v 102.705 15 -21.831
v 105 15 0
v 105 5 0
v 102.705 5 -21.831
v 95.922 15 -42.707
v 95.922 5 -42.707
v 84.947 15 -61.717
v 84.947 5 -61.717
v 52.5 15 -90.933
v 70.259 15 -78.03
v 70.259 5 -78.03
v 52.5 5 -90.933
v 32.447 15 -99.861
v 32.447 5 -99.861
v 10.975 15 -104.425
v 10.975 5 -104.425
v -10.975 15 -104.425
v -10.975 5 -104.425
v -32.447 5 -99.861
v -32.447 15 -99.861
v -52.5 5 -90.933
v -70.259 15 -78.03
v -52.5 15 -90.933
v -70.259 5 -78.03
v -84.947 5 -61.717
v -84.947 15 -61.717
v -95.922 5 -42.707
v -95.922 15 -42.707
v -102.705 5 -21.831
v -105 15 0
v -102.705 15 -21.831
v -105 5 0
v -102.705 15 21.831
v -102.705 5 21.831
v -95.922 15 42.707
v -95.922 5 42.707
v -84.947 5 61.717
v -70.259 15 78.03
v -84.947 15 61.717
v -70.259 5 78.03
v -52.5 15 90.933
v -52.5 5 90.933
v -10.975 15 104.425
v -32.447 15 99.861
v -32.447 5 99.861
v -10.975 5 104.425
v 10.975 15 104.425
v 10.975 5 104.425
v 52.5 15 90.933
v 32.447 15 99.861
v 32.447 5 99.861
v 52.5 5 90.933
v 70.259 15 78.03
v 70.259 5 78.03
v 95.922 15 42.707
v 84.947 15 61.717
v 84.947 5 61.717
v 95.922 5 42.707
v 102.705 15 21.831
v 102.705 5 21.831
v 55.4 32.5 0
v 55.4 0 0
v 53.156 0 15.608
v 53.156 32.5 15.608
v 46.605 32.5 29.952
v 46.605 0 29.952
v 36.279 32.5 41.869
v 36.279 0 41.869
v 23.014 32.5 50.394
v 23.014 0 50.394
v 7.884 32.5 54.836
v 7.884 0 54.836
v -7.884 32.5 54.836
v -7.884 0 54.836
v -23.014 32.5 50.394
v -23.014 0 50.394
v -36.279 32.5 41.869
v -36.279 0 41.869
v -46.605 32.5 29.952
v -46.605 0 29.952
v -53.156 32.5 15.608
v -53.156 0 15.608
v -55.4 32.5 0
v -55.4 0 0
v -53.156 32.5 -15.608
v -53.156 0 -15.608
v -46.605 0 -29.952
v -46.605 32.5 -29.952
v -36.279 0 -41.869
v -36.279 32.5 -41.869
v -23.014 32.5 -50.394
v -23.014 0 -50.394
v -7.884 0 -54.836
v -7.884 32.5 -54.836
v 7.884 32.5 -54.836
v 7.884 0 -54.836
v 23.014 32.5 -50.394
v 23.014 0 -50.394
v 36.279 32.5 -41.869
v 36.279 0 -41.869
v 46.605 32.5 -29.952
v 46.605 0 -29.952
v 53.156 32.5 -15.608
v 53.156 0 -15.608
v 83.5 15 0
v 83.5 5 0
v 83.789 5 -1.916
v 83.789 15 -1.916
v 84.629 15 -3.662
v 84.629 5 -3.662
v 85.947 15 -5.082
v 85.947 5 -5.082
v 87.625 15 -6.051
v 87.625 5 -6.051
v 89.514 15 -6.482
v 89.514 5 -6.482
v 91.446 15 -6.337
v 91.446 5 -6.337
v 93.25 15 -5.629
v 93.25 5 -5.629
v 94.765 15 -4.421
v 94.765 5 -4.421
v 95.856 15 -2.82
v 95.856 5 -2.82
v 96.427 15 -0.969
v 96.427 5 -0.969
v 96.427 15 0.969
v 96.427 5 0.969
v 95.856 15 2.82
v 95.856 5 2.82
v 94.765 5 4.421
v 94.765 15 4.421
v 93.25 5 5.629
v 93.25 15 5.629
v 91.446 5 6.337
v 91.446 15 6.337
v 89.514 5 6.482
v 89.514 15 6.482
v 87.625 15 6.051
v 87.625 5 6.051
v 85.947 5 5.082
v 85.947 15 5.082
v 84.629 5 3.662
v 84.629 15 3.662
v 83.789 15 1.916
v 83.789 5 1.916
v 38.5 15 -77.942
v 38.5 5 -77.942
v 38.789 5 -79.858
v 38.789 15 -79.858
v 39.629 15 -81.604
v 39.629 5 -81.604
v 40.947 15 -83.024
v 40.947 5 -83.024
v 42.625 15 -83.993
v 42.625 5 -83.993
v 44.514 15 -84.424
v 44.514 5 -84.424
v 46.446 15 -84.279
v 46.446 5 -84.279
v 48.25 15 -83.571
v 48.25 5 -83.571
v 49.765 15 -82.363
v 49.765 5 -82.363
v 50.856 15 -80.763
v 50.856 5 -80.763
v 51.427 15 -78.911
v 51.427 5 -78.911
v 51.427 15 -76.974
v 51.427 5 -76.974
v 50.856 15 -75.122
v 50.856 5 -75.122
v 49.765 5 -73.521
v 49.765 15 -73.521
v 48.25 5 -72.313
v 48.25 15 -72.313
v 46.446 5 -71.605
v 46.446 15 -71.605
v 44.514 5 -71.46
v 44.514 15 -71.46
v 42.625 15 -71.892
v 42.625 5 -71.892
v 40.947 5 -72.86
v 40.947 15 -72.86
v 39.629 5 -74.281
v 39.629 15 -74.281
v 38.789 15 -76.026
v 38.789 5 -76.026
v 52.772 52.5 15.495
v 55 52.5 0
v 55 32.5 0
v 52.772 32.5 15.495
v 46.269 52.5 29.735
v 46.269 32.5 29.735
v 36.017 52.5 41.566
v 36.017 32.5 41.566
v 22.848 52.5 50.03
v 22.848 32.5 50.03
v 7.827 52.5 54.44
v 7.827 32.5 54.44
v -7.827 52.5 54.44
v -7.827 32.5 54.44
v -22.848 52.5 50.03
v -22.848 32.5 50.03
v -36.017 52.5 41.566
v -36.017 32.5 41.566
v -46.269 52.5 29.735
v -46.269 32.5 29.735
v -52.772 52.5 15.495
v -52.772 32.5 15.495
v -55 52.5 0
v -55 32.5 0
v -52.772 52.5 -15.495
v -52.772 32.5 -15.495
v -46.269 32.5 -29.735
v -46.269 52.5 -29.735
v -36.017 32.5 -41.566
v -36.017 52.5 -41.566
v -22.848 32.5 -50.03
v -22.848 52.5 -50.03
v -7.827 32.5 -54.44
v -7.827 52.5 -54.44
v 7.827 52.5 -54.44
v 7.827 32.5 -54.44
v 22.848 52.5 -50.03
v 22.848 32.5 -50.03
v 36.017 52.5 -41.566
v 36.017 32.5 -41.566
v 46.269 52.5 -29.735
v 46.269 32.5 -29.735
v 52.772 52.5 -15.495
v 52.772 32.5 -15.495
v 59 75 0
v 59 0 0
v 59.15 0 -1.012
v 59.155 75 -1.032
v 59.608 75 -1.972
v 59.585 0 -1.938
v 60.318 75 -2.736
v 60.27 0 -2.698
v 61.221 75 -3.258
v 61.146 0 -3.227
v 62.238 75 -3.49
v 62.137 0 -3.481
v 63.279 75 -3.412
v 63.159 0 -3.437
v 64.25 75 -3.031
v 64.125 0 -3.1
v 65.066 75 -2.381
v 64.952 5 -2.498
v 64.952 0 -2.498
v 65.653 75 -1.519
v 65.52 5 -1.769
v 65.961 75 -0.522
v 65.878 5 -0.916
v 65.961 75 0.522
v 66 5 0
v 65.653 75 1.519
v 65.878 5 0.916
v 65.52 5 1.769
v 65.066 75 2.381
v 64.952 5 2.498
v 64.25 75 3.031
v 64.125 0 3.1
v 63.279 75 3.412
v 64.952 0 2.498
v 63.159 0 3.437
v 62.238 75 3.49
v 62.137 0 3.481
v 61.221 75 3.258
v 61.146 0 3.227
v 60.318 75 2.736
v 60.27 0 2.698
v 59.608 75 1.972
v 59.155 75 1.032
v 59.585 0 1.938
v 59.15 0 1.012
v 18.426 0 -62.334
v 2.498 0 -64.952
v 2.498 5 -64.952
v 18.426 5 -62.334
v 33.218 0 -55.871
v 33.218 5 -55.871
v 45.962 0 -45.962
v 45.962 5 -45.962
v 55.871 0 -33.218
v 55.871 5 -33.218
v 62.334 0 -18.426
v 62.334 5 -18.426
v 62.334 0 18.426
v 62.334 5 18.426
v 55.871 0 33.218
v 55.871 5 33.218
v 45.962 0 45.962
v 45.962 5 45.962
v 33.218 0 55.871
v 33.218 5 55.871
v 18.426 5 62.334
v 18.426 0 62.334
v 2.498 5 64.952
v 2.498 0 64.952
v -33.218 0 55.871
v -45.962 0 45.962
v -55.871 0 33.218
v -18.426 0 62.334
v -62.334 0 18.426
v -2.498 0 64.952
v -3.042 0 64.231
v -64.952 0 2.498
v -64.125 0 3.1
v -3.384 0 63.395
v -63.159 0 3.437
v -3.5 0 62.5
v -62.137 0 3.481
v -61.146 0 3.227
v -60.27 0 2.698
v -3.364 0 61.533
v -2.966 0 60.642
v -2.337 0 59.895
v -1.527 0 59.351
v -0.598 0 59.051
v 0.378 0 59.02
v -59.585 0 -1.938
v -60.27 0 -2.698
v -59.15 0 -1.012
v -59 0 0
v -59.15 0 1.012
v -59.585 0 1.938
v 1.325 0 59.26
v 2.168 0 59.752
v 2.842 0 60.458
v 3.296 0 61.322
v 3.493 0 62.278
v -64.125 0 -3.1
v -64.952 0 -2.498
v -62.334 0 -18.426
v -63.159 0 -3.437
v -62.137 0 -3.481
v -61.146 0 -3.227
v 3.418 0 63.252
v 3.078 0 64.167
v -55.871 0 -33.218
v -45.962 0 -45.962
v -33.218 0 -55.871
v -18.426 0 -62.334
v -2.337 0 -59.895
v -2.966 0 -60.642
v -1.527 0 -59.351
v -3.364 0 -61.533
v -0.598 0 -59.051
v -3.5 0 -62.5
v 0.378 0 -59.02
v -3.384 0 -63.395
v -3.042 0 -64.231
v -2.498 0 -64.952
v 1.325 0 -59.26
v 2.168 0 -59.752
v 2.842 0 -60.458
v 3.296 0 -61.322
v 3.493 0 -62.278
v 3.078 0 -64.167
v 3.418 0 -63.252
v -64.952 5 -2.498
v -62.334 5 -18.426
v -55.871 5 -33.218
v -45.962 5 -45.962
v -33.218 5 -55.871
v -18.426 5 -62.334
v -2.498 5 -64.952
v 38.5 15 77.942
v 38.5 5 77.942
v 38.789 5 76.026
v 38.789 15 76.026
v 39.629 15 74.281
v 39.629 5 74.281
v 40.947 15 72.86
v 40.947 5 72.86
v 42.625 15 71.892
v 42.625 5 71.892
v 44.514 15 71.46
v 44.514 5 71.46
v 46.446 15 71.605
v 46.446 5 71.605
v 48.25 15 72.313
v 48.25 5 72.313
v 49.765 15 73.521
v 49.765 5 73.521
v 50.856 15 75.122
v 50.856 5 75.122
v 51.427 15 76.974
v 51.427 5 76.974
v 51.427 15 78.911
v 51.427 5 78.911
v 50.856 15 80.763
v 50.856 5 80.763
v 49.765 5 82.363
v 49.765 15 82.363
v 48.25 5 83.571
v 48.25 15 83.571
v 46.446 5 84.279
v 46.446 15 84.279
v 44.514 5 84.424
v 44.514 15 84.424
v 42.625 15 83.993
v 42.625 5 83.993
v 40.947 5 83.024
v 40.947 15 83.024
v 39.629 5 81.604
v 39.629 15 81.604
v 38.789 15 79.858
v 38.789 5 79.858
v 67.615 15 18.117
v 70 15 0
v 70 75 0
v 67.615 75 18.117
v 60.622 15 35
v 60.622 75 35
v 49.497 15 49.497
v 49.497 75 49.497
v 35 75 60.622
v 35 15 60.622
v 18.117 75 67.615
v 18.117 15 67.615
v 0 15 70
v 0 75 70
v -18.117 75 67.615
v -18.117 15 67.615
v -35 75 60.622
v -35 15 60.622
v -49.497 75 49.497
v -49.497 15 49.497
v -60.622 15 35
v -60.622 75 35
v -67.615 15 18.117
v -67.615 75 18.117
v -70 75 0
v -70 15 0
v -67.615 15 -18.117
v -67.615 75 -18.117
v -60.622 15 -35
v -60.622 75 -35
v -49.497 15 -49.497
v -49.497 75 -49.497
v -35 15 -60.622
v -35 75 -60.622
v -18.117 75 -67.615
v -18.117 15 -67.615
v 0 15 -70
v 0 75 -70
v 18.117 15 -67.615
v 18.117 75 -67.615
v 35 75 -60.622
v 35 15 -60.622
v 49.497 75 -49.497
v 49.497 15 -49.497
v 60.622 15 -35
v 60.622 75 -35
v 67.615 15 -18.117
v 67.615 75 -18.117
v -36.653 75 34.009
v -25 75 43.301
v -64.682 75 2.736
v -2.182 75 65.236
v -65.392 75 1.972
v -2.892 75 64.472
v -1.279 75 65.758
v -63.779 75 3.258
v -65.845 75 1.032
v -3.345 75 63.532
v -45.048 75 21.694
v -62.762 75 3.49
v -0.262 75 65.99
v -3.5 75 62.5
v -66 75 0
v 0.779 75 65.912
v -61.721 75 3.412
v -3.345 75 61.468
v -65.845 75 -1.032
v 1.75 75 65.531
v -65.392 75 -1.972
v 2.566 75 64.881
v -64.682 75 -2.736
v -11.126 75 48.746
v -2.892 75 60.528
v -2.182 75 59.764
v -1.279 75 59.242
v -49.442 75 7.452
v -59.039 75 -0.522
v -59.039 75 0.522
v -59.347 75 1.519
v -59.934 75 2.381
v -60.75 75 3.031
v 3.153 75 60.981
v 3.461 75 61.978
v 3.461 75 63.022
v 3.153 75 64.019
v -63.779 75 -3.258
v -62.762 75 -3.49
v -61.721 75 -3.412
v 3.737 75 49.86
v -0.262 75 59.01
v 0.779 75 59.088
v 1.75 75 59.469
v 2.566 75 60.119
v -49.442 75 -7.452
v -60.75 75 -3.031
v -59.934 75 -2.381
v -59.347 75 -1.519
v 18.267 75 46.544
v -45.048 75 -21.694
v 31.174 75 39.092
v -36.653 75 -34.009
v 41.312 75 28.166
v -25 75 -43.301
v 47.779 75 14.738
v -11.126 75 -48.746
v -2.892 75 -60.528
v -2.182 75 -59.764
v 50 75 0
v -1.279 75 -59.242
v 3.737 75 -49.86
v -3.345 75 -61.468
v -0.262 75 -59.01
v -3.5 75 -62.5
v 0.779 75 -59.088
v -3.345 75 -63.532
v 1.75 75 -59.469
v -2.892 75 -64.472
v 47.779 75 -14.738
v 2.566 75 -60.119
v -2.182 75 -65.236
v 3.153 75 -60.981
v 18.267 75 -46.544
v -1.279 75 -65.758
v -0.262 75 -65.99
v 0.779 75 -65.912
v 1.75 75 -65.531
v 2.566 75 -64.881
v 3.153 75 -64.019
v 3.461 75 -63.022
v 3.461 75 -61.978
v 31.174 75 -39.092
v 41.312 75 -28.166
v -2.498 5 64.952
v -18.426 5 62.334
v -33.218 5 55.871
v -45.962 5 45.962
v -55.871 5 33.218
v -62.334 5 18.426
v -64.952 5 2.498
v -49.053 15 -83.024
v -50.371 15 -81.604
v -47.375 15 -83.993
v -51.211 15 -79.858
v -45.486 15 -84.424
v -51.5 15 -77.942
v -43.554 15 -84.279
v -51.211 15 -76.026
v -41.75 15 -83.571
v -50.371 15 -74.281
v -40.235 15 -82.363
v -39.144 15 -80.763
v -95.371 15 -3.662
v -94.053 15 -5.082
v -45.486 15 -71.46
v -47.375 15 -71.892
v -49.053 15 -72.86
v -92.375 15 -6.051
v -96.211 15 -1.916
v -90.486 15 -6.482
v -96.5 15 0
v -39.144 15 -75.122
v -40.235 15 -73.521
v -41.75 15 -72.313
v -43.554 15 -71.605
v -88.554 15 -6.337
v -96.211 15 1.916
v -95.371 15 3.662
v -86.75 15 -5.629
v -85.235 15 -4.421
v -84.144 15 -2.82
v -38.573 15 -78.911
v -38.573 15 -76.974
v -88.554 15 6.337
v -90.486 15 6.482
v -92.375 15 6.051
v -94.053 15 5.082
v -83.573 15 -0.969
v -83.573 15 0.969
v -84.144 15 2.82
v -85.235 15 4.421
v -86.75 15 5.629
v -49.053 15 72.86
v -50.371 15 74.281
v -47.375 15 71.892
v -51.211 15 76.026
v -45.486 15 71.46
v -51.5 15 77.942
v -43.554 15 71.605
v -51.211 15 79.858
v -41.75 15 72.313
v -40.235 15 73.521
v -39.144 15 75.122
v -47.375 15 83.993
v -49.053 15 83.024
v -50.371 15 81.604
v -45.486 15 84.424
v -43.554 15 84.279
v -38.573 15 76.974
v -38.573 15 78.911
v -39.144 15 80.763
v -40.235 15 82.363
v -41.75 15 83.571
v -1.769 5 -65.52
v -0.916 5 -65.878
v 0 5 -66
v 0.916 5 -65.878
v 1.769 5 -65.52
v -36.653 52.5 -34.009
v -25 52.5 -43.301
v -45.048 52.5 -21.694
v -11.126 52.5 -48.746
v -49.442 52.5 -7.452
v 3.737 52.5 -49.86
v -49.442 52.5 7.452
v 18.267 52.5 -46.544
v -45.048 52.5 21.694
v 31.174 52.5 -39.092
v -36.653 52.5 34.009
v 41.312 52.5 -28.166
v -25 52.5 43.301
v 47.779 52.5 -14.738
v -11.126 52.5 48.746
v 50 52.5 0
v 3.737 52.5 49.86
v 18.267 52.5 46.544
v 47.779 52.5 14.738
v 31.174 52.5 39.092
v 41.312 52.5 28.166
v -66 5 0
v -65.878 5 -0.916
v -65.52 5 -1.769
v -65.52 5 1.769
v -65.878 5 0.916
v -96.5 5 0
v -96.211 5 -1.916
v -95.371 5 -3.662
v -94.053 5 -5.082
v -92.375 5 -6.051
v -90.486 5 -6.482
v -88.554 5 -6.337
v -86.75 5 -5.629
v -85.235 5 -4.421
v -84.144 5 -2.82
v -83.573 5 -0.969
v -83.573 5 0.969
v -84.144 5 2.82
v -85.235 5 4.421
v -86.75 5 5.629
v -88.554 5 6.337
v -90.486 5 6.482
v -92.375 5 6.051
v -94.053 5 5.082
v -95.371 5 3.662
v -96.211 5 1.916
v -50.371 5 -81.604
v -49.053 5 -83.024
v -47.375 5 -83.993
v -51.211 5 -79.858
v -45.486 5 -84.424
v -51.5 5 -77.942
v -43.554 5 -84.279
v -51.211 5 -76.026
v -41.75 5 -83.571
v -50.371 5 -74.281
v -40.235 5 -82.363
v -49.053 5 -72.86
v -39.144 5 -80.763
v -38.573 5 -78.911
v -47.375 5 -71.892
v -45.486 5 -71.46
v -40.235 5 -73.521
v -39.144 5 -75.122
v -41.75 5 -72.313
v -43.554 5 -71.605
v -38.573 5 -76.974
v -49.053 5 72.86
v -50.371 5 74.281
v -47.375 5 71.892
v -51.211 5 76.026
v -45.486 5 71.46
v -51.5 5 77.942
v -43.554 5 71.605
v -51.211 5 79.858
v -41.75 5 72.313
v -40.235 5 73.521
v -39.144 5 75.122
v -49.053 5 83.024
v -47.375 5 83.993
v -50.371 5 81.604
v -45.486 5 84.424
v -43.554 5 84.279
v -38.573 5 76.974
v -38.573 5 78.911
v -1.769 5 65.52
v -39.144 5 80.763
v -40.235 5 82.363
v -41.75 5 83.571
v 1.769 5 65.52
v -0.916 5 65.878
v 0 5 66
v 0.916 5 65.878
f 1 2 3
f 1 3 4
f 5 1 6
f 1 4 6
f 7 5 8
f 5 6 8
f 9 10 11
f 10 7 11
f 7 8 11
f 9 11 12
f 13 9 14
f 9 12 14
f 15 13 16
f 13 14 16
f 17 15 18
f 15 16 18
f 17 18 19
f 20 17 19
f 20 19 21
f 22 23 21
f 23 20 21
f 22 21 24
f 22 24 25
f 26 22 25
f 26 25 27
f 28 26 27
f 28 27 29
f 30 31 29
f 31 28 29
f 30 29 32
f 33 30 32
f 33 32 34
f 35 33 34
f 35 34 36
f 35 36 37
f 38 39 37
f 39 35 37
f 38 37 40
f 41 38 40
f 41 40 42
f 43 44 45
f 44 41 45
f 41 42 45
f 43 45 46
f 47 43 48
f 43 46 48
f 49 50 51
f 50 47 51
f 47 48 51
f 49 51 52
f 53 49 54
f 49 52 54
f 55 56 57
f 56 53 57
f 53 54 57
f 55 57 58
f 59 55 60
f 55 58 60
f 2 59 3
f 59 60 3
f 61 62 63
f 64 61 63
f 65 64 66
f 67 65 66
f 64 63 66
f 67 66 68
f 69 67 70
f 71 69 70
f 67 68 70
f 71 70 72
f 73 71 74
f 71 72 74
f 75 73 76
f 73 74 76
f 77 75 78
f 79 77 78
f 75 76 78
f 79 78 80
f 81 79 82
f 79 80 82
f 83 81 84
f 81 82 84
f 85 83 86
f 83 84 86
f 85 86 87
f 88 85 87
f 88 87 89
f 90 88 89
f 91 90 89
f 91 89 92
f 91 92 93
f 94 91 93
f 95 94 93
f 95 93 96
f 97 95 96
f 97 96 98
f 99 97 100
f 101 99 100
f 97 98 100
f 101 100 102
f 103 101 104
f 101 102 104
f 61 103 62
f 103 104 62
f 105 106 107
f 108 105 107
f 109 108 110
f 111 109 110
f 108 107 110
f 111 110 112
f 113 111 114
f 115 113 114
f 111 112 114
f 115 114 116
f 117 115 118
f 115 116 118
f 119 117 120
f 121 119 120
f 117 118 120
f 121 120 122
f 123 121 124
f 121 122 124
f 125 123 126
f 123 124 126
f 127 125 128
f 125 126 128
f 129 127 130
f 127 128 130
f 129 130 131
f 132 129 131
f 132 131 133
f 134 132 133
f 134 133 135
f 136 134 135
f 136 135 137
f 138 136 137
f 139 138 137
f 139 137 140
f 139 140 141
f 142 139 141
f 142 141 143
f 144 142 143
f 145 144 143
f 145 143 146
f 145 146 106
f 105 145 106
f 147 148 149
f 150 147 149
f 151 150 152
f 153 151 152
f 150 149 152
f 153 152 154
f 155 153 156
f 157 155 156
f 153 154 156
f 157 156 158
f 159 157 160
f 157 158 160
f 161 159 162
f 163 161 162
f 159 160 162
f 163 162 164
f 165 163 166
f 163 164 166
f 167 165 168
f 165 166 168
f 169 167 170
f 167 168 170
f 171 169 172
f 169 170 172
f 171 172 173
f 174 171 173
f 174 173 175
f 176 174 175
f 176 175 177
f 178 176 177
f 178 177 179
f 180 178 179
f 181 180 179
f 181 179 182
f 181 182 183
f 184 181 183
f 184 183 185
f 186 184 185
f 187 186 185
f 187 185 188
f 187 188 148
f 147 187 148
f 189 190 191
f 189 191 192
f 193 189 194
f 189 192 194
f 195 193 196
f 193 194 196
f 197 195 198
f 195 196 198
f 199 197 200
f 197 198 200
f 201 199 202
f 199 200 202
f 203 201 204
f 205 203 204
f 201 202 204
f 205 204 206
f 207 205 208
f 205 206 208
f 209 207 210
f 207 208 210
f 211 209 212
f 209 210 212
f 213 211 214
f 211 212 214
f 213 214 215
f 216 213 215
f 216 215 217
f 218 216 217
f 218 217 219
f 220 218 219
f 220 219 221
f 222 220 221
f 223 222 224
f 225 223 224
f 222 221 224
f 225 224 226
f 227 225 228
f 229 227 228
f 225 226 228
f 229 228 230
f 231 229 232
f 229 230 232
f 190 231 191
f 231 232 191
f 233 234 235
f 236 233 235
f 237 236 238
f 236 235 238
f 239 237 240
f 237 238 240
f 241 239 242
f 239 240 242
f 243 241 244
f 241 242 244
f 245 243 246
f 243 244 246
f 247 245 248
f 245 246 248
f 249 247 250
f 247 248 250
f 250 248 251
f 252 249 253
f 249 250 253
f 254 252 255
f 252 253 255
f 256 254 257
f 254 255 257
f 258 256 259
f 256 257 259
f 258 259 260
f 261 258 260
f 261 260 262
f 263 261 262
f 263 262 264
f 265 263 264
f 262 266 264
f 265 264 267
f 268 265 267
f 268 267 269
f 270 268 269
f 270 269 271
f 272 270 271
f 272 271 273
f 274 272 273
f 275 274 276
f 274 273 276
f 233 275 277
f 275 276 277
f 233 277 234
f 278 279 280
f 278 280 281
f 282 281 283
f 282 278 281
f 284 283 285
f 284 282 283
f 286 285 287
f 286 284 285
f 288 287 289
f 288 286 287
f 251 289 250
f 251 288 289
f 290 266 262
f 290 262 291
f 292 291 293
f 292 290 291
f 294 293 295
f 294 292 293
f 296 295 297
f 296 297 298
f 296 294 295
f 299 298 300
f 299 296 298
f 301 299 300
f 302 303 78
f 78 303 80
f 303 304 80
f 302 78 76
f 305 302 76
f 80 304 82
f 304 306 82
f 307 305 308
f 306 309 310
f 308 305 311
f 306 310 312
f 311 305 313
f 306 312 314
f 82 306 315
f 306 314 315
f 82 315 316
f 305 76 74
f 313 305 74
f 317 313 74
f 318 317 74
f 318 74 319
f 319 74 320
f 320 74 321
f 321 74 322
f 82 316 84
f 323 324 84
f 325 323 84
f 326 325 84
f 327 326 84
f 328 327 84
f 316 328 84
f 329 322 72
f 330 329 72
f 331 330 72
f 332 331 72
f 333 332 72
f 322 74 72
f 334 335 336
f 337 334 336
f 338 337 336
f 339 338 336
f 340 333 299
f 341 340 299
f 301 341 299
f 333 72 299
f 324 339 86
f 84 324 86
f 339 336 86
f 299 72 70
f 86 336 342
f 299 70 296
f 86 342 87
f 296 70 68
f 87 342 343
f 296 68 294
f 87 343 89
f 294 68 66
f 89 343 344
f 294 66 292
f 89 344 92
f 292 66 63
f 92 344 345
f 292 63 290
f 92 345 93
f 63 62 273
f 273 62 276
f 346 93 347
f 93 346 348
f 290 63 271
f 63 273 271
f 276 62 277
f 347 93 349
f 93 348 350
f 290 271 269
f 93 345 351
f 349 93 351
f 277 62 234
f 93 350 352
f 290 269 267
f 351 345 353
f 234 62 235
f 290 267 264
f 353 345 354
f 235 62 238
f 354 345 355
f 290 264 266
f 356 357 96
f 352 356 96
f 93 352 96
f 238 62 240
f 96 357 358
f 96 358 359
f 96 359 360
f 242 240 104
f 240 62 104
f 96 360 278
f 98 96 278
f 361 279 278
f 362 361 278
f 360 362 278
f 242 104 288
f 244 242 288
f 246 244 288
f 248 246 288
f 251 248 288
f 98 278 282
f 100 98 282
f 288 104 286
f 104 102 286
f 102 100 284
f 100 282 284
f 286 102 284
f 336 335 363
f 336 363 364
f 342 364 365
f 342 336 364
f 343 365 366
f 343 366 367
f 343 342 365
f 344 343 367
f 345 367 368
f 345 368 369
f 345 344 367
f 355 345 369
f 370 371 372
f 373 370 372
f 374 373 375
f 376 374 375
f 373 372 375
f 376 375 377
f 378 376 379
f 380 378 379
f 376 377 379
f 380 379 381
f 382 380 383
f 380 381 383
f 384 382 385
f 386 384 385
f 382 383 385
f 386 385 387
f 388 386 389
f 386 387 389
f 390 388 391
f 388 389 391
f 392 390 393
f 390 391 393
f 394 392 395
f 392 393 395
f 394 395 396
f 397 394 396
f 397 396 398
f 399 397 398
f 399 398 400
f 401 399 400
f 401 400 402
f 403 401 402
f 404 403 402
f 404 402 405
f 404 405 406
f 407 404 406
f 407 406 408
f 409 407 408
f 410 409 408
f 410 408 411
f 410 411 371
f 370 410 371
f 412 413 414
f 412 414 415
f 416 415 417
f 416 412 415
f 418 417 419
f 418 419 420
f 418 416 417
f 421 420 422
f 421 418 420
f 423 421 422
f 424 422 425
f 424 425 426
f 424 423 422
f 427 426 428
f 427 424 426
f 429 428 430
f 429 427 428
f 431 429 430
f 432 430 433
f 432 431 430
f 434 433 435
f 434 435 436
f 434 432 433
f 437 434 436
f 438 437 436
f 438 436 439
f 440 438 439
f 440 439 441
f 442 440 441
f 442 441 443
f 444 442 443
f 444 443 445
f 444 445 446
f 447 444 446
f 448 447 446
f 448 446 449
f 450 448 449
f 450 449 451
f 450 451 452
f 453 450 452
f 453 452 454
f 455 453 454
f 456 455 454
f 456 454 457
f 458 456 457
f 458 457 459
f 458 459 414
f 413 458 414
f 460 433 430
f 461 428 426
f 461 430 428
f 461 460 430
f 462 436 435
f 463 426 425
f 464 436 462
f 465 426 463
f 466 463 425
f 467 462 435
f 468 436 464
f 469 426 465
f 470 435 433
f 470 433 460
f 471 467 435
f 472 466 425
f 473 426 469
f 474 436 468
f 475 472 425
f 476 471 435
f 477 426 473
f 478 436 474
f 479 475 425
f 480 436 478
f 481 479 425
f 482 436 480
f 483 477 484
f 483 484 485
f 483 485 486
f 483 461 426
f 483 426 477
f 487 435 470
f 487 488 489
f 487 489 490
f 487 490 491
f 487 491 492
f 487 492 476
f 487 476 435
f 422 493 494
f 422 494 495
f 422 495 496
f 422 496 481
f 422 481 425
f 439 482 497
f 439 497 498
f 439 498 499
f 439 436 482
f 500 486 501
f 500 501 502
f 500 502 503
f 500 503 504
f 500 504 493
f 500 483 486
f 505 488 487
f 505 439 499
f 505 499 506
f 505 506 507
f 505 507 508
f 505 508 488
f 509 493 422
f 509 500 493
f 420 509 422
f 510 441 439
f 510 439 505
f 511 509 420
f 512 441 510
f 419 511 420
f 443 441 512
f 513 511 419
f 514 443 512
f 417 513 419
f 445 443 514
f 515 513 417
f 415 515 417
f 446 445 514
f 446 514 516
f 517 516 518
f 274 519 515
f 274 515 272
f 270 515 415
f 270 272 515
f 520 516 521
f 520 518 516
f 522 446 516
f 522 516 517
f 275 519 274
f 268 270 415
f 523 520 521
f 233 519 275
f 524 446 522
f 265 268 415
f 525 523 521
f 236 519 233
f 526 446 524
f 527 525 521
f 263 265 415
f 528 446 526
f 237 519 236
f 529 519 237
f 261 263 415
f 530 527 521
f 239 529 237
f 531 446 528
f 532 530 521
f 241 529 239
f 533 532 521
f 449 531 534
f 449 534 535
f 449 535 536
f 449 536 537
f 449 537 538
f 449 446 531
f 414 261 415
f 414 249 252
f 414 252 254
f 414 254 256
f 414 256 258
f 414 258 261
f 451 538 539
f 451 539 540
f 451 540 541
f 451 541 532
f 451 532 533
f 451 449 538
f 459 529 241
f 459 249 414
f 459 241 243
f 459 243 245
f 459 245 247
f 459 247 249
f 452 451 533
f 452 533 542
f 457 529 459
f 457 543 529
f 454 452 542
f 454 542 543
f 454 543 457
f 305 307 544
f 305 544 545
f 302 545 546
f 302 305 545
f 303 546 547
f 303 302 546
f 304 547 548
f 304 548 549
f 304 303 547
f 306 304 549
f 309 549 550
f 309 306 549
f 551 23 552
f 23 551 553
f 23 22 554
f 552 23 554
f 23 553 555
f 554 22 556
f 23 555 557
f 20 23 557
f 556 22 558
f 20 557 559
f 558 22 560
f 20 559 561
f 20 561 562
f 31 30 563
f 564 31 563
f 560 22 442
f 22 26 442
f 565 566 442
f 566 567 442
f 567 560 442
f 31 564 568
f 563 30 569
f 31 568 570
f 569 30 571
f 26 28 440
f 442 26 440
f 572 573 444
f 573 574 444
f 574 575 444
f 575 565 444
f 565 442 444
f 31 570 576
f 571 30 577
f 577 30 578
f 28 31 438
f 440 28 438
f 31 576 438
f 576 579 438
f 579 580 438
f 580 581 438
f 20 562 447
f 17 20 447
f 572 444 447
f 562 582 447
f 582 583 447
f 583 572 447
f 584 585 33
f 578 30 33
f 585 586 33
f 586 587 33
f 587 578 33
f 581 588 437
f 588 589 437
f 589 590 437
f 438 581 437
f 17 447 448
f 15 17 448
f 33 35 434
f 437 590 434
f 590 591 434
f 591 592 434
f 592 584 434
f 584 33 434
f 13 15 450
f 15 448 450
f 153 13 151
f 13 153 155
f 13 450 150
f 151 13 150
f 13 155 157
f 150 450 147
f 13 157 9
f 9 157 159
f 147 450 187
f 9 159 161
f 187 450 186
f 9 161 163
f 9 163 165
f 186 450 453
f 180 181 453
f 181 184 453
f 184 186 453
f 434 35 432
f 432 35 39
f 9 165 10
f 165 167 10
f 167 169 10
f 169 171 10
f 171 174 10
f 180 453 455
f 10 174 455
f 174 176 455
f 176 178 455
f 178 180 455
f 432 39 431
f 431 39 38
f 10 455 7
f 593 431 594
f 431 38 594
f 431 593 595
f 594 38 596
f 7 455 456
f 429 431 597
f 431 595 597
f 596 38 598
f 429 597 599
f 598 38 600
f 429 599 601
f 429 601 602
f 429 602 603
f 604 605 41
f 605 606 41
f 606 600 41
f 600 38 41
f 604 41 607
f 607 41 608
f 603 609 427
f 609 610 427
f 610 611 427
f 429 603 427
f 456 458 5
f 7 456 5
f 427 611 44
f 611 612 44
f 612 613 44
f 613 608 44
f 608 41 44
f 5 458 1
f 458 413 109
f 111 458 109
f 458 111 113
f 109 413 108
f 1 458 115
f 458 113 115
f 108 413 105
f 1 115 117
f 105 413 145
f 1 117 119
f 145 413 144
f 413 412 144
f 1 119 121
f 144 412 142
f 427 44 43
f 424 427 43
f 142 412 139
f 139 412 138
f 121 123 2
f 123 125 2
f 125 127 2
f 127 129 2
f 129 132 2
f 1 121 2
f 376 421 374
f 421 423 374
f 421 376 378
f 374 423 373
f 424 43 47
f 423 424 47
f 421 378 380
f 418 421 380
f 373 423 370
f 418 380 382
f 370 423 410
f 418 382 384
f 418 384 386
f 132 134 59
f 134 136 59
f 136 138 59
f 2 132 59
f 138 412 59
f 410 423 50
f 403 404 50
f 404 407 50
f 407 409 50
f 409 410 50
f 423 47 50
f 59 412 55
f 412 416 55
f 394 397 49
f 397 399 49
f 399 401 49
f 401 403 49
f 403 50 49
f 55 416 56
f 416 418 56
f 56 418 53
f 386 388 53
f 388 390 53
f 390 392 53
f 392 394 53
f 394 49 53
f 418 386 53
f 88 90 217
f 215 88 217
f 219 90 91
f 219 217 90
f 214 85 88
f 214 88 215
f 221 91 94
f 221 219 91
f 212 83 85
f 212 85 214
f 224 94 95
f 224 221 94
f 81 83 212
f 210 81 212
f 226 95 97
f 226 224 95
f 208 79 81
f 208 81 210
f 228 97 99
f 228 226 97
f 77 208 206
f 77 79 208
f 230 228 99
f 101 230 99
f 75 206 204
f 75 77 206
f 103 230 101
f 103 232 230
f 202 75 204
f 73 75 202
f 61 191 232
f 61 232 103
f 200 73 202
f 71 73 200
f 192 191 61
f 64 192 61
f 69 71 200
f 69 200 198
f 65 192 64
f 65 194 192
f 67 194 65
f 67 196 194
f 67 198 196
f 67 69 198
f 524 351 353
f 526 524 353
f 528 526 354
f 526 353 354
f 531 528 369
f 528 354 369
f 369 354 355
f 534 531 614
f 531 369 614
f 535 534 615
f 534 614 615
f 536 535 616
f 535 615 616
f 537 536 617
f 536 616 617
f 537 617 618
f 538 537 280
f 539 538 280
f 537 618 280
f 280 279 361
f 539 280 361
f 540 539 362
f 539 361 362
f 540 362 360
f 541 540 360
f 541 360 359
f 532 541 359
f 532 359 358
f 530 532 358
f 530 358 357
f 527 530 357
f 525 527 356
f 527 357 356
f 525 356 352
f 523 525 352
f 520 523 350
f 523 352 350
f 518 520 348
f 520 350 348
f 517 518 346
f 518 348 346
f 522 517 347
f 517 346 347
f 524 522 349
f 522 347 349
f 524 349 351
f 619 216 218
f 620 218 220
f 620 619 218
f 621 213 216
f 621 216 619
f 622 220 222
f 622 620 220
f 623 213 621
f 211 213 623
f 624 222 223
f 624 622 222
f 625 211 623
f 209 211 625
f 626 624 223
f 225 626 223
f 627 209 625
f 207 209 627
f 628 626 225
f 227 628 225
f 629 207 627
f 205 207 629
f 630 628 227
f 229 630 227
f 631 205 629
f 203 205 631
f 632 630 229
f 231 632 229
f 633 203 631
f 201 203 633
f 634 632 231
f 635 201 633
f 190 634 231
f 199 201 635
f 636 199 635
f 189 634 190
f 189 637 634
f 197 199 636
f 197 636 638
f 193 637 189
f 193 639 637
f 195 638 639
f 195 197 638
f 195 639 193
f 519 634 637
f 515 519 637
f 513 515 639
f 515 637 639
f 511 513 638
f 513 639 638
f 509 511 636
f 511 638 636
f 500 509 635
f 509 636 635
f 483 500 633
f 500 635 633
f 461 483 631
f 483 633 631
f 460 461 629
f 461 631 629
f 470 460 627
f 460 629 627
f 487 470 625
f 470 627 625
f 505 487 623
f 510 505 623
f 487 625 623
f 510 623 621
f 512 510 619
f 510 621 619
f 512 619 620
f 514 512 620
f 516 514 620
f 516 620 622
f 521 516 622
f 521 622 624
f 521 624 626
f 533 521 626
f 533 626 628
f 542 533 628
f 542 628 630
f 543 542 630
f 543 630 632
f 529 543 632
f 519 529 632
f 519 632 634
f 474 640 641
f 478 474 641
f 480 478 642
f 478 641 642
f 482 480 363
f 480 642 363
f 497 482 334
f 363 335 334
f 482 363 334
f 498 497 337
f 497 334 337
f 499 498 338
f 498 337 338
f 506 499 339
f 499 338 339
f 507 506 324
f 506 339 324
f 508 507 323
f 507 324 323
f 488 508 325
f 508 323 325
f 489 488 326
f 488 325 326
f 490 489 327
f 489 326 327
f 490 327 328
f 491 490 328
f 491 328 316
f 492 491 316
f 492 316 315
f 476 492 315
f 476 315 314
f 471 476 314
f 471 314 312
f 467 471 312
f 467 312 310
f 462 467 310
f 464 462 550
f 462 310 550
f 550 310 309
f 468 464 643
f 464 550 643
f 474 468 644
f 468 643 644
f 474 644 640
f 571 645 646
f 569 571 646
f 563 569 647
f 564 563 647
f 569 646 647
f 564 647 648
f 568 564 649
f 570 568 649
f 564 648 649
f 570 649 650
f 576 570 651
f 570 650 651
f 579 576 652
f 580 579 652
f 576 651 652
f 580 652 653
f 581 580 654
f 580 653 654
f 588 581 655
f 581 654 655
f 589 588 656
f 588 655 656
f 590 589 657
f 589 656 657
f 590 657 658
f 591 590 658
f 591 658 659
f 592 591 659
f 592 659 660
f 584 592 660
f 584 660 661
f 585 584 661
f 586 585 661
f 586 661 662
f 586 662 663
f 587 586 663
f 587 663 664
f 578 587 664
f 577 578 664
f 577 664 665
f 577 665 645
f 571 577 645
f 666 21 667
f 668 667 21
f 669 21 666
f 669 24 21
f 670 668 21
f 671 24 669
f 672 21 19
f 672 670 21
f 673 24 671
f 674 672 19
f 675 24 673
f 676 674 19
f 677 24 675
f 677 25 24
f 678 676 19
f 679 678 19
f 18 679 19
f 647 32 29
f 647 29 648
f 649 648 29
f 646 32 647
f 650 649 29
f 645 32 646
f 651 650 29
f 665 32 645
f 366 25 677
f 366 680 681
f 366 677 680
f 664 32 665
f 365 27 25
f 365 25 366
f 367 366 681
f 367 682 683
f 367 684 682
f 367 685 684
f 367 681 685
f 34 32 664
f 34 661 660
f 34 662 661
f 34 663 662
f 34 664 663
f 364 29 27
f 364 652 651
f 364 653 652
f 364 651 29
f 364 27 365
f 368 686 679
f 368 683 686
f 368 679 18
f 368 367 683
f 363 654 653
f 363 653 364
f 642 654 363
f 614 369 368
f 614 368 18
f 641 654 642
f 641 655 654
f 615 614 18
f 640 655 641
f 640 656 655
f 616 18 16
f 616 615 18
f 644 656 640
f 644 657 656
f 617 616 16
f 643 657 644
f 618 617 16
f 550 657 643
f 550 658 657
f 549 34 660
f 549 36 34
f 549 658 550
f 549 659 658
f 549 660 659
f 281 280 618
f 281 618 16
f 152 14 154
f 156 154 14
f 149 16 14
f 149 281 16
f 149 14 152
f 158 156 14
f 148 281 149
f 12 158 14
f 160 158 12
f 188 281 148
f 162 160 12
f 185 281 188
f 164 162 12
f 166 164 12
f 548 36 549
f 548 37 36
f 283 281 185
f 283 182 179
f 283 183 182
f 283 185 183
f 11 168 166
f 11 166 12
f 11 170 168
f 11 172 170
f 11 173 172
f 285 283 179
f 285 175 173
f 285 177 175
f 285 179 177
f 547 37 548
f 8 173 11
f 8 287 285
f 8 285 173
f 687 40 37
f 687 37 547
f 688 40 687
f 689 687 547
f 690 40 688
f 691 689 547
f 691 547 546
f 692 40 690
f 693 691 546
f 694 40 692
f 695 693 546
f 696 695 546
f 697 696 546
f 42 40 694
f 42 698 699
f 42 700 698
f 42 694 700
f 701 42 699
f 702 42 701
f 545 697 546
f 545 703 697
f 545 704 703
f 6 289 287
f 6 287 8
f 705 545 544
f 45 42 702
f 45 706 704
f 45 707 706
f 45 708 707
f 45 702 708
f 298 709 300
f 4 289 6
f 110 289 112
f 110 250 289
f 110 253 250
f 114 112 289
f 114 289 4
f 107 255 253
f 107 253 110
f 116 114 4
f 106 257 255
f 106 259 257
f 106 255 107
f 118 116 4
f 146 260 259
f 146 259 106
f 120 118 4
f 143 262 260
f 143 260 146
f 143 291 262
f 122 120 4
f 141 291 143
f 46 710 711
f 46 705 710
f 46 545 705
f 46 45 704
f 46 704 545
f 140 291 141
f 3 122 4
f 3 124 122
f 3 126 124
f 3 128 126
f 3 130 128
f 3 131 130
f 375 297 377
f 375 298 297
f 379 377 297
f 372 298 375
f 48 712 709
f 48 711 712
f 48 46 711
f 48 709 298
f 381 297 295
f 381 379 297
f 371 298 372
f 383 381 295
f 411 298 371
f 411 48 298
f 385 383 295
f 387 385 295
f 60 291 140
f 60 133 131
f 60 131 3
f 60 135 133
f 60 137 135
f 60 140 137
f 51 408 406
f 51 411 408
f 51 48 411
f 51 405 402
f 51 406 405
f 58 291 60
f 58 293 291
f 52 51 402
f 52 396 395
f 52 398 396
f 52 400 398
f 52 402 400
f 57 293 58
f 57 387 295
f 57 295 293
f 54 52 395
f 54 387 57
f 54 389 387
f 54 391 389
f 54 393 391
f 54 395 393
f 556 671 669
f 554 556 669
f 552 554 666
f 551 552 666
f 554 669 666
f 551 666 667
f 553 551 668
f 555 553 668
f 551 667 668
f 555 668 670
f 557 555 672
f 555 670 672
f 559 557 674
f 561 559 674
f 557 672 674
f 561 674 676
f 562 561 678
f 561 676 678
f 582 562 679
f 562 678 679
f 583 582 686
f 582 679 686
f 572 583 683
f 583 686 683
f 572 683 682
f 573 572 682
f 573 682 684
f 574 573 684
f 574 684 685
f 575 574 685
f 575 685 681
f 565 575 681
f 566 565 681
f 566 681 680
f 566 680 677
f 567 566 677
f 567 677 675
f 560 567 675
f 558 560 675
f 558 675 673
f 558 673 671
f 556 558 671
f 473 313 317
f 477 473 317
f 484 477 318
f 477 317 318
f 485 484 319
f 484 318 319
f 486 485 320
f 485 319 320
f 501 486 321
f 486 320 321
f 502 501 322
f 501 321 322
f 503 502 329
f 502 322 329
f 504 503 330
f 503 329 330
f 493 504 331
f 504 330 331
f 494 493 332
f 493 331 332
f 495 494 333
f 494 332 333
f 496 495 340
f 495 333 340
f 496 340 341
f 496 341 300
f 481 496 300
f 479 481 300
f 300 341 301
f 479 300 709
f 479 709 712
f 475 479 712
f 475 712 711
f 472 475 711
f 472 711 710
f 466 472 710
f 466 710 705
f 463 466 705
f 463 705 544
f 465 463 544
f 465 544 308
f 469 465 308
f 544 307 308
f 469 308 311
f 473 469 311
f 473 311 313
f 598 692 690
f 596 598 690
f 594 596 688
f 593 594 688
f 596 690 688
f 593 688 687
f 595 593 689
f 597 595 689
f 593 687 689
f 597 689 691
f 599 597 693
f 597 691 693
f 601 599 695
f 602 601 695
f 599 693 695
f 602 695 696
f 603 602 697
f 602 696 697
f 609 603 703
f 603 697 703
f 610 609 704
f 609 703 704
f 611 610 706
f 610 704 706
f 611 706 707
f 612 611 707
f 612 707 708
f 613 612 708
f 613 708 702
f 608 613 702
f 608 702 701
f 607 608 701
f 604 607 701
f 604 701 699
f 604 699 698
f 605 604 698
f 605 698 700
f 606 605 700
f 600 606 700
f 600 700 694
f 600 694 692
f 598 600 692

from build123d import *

# Parameters (mm, degrees)
SKETCH1_R              = 105
BOSS_EXTRUDE1_DEPTH    = 75
SKETCH3_R              = 105
SKETCH3_R_2            = 65
CUT_EXTRUDE1_DEPTH     = 5
CUT_EXTRUDE2_REACH     = 92
CUT_EXTRUDE2_START     = -15
SKETCH4_R              = 105
SKETCH4_R_2            = 70
SKETCH5_R              = 55.4
CUT_EXTRUDE3_DEPTH     = 32.5
SKETCH6_R              = 55
CUT_EXTRUDE4_DEPTH     = 20
CUT_EXTRUDE5_REACH     = 24.5
SKETCH7_R              = 50
F_12_0MM_DOWEL_HOLE1_D = 13
F_6_0MM_DOWEL_HOLE1_D  = 7


with BuildPart() as part:
    # Sketch1 → Boss-Extrude1 (new body)
    with BuildSketch(Plane(origin=(0, 0, 0), x_dir=(1, 0, 0), z_dir=(0, 1, 0))):
        Circle(SKETCH1_R)
    extrude(amount=BOSS_EXTRUDE1_DEPTH)

    # Sketch3 → Cut-Extrude1 (cut)
    with BuildSketch(Plane.XZ):
        Circle(SKETCH3_R)
        Circle(SKETCH3_R_2, mode=Mode.SUBTRACT)
    extrude(amount=-CUT_EXTRUDE1_DEPTH, mode=Mode.SUBTRACT)

    # Sketch4 → Cut-Extrude2 (cut, up to next)
    with BuildSketch(Plane.XZ.offset(CUT_EXTRUDE2_START), mode=Mode.PRIVATE) as cut_extrude2_sk1:
        Circle(SKETCH4_R)
        Circle(SKETCH4_R_2, mode=Mode.SUBTRACT)
    cut_extrude2_tool1 = extrude(cut_extrude2_sk1.sketch, amount=-CUT_EXTRUDE2_REACH, mode=Mode.PRIVATE) & part.part
    add(cut_extrude2_tool1.solids().sort_by_distance((-102.030152, 15, 0))[0], mode=Mode.SUBTRACT)

    # Sketch5 → Cut-Extrude3 (cut)
    with BuildSketch(Plane.XZ):
        Circle(SKETCH5_R)
    extrude(amount=-CUT_EXTRUDE3_DEPTH, mode=Mode.SUBTRACT)

    # Sketch6 → Cut-Extrude4 (cut)
    with BuildSketch(Plane.XZ.offset(-32.5)):
        Circle(SKETCH6_R)
    extrude(amount=-CUT_EXTRUDE4_DEPTH, mode=Mode.SUBTRACT)

    # Sketch7 → Cut-Extrude5 (cut, up to next)
    with BuildSketch(Plane.XZ.offset(-52.5), mode=Mode.PRIVATE) as cut_extrude5_sk1:
        Circle(SKETCH7_R)
    cut_extrude5_tool1 = extrude(cut_extrude5_sk1.sketch, amount=-CUT_EXTRUDE5_REACH, mode=Mode.PRIVATE) & part.part
    add(cut_extrude5_tool1.solids().sort_by_distance((0, 52.5, 0))[0], mode=Mode.SUBTRACT)

    # Ø12.0mm Dowel Hole1 (through all)
    with Locations(Plane(origin=(0, 15, 0), x_dir=(1, 0, 0), z_dir=(0, 1, 0))):
        with Locations((45, 77.942286341), (90, 0), (45, -77.942286341), (-45, -77.942286341), (-90, 0), (-45, 77.942286341)):
            Hole(F_12_0MM_DOWEL_HOLE1_D / 2)

    # Ø6.0mm Dowel Hole1 (through all)
    with Locations(Plane(origin=(0, 75, 0), x_dir=(1, 0, 0), z_dir=(0, 1, 0))):
        with Locations((-62.5, 0), (0, 62.5), (62.5, 0), (0, -62.5)):
            Hole(F_6_0MM_DOWEL_HOLE1_D / 2)


solid = part.part
